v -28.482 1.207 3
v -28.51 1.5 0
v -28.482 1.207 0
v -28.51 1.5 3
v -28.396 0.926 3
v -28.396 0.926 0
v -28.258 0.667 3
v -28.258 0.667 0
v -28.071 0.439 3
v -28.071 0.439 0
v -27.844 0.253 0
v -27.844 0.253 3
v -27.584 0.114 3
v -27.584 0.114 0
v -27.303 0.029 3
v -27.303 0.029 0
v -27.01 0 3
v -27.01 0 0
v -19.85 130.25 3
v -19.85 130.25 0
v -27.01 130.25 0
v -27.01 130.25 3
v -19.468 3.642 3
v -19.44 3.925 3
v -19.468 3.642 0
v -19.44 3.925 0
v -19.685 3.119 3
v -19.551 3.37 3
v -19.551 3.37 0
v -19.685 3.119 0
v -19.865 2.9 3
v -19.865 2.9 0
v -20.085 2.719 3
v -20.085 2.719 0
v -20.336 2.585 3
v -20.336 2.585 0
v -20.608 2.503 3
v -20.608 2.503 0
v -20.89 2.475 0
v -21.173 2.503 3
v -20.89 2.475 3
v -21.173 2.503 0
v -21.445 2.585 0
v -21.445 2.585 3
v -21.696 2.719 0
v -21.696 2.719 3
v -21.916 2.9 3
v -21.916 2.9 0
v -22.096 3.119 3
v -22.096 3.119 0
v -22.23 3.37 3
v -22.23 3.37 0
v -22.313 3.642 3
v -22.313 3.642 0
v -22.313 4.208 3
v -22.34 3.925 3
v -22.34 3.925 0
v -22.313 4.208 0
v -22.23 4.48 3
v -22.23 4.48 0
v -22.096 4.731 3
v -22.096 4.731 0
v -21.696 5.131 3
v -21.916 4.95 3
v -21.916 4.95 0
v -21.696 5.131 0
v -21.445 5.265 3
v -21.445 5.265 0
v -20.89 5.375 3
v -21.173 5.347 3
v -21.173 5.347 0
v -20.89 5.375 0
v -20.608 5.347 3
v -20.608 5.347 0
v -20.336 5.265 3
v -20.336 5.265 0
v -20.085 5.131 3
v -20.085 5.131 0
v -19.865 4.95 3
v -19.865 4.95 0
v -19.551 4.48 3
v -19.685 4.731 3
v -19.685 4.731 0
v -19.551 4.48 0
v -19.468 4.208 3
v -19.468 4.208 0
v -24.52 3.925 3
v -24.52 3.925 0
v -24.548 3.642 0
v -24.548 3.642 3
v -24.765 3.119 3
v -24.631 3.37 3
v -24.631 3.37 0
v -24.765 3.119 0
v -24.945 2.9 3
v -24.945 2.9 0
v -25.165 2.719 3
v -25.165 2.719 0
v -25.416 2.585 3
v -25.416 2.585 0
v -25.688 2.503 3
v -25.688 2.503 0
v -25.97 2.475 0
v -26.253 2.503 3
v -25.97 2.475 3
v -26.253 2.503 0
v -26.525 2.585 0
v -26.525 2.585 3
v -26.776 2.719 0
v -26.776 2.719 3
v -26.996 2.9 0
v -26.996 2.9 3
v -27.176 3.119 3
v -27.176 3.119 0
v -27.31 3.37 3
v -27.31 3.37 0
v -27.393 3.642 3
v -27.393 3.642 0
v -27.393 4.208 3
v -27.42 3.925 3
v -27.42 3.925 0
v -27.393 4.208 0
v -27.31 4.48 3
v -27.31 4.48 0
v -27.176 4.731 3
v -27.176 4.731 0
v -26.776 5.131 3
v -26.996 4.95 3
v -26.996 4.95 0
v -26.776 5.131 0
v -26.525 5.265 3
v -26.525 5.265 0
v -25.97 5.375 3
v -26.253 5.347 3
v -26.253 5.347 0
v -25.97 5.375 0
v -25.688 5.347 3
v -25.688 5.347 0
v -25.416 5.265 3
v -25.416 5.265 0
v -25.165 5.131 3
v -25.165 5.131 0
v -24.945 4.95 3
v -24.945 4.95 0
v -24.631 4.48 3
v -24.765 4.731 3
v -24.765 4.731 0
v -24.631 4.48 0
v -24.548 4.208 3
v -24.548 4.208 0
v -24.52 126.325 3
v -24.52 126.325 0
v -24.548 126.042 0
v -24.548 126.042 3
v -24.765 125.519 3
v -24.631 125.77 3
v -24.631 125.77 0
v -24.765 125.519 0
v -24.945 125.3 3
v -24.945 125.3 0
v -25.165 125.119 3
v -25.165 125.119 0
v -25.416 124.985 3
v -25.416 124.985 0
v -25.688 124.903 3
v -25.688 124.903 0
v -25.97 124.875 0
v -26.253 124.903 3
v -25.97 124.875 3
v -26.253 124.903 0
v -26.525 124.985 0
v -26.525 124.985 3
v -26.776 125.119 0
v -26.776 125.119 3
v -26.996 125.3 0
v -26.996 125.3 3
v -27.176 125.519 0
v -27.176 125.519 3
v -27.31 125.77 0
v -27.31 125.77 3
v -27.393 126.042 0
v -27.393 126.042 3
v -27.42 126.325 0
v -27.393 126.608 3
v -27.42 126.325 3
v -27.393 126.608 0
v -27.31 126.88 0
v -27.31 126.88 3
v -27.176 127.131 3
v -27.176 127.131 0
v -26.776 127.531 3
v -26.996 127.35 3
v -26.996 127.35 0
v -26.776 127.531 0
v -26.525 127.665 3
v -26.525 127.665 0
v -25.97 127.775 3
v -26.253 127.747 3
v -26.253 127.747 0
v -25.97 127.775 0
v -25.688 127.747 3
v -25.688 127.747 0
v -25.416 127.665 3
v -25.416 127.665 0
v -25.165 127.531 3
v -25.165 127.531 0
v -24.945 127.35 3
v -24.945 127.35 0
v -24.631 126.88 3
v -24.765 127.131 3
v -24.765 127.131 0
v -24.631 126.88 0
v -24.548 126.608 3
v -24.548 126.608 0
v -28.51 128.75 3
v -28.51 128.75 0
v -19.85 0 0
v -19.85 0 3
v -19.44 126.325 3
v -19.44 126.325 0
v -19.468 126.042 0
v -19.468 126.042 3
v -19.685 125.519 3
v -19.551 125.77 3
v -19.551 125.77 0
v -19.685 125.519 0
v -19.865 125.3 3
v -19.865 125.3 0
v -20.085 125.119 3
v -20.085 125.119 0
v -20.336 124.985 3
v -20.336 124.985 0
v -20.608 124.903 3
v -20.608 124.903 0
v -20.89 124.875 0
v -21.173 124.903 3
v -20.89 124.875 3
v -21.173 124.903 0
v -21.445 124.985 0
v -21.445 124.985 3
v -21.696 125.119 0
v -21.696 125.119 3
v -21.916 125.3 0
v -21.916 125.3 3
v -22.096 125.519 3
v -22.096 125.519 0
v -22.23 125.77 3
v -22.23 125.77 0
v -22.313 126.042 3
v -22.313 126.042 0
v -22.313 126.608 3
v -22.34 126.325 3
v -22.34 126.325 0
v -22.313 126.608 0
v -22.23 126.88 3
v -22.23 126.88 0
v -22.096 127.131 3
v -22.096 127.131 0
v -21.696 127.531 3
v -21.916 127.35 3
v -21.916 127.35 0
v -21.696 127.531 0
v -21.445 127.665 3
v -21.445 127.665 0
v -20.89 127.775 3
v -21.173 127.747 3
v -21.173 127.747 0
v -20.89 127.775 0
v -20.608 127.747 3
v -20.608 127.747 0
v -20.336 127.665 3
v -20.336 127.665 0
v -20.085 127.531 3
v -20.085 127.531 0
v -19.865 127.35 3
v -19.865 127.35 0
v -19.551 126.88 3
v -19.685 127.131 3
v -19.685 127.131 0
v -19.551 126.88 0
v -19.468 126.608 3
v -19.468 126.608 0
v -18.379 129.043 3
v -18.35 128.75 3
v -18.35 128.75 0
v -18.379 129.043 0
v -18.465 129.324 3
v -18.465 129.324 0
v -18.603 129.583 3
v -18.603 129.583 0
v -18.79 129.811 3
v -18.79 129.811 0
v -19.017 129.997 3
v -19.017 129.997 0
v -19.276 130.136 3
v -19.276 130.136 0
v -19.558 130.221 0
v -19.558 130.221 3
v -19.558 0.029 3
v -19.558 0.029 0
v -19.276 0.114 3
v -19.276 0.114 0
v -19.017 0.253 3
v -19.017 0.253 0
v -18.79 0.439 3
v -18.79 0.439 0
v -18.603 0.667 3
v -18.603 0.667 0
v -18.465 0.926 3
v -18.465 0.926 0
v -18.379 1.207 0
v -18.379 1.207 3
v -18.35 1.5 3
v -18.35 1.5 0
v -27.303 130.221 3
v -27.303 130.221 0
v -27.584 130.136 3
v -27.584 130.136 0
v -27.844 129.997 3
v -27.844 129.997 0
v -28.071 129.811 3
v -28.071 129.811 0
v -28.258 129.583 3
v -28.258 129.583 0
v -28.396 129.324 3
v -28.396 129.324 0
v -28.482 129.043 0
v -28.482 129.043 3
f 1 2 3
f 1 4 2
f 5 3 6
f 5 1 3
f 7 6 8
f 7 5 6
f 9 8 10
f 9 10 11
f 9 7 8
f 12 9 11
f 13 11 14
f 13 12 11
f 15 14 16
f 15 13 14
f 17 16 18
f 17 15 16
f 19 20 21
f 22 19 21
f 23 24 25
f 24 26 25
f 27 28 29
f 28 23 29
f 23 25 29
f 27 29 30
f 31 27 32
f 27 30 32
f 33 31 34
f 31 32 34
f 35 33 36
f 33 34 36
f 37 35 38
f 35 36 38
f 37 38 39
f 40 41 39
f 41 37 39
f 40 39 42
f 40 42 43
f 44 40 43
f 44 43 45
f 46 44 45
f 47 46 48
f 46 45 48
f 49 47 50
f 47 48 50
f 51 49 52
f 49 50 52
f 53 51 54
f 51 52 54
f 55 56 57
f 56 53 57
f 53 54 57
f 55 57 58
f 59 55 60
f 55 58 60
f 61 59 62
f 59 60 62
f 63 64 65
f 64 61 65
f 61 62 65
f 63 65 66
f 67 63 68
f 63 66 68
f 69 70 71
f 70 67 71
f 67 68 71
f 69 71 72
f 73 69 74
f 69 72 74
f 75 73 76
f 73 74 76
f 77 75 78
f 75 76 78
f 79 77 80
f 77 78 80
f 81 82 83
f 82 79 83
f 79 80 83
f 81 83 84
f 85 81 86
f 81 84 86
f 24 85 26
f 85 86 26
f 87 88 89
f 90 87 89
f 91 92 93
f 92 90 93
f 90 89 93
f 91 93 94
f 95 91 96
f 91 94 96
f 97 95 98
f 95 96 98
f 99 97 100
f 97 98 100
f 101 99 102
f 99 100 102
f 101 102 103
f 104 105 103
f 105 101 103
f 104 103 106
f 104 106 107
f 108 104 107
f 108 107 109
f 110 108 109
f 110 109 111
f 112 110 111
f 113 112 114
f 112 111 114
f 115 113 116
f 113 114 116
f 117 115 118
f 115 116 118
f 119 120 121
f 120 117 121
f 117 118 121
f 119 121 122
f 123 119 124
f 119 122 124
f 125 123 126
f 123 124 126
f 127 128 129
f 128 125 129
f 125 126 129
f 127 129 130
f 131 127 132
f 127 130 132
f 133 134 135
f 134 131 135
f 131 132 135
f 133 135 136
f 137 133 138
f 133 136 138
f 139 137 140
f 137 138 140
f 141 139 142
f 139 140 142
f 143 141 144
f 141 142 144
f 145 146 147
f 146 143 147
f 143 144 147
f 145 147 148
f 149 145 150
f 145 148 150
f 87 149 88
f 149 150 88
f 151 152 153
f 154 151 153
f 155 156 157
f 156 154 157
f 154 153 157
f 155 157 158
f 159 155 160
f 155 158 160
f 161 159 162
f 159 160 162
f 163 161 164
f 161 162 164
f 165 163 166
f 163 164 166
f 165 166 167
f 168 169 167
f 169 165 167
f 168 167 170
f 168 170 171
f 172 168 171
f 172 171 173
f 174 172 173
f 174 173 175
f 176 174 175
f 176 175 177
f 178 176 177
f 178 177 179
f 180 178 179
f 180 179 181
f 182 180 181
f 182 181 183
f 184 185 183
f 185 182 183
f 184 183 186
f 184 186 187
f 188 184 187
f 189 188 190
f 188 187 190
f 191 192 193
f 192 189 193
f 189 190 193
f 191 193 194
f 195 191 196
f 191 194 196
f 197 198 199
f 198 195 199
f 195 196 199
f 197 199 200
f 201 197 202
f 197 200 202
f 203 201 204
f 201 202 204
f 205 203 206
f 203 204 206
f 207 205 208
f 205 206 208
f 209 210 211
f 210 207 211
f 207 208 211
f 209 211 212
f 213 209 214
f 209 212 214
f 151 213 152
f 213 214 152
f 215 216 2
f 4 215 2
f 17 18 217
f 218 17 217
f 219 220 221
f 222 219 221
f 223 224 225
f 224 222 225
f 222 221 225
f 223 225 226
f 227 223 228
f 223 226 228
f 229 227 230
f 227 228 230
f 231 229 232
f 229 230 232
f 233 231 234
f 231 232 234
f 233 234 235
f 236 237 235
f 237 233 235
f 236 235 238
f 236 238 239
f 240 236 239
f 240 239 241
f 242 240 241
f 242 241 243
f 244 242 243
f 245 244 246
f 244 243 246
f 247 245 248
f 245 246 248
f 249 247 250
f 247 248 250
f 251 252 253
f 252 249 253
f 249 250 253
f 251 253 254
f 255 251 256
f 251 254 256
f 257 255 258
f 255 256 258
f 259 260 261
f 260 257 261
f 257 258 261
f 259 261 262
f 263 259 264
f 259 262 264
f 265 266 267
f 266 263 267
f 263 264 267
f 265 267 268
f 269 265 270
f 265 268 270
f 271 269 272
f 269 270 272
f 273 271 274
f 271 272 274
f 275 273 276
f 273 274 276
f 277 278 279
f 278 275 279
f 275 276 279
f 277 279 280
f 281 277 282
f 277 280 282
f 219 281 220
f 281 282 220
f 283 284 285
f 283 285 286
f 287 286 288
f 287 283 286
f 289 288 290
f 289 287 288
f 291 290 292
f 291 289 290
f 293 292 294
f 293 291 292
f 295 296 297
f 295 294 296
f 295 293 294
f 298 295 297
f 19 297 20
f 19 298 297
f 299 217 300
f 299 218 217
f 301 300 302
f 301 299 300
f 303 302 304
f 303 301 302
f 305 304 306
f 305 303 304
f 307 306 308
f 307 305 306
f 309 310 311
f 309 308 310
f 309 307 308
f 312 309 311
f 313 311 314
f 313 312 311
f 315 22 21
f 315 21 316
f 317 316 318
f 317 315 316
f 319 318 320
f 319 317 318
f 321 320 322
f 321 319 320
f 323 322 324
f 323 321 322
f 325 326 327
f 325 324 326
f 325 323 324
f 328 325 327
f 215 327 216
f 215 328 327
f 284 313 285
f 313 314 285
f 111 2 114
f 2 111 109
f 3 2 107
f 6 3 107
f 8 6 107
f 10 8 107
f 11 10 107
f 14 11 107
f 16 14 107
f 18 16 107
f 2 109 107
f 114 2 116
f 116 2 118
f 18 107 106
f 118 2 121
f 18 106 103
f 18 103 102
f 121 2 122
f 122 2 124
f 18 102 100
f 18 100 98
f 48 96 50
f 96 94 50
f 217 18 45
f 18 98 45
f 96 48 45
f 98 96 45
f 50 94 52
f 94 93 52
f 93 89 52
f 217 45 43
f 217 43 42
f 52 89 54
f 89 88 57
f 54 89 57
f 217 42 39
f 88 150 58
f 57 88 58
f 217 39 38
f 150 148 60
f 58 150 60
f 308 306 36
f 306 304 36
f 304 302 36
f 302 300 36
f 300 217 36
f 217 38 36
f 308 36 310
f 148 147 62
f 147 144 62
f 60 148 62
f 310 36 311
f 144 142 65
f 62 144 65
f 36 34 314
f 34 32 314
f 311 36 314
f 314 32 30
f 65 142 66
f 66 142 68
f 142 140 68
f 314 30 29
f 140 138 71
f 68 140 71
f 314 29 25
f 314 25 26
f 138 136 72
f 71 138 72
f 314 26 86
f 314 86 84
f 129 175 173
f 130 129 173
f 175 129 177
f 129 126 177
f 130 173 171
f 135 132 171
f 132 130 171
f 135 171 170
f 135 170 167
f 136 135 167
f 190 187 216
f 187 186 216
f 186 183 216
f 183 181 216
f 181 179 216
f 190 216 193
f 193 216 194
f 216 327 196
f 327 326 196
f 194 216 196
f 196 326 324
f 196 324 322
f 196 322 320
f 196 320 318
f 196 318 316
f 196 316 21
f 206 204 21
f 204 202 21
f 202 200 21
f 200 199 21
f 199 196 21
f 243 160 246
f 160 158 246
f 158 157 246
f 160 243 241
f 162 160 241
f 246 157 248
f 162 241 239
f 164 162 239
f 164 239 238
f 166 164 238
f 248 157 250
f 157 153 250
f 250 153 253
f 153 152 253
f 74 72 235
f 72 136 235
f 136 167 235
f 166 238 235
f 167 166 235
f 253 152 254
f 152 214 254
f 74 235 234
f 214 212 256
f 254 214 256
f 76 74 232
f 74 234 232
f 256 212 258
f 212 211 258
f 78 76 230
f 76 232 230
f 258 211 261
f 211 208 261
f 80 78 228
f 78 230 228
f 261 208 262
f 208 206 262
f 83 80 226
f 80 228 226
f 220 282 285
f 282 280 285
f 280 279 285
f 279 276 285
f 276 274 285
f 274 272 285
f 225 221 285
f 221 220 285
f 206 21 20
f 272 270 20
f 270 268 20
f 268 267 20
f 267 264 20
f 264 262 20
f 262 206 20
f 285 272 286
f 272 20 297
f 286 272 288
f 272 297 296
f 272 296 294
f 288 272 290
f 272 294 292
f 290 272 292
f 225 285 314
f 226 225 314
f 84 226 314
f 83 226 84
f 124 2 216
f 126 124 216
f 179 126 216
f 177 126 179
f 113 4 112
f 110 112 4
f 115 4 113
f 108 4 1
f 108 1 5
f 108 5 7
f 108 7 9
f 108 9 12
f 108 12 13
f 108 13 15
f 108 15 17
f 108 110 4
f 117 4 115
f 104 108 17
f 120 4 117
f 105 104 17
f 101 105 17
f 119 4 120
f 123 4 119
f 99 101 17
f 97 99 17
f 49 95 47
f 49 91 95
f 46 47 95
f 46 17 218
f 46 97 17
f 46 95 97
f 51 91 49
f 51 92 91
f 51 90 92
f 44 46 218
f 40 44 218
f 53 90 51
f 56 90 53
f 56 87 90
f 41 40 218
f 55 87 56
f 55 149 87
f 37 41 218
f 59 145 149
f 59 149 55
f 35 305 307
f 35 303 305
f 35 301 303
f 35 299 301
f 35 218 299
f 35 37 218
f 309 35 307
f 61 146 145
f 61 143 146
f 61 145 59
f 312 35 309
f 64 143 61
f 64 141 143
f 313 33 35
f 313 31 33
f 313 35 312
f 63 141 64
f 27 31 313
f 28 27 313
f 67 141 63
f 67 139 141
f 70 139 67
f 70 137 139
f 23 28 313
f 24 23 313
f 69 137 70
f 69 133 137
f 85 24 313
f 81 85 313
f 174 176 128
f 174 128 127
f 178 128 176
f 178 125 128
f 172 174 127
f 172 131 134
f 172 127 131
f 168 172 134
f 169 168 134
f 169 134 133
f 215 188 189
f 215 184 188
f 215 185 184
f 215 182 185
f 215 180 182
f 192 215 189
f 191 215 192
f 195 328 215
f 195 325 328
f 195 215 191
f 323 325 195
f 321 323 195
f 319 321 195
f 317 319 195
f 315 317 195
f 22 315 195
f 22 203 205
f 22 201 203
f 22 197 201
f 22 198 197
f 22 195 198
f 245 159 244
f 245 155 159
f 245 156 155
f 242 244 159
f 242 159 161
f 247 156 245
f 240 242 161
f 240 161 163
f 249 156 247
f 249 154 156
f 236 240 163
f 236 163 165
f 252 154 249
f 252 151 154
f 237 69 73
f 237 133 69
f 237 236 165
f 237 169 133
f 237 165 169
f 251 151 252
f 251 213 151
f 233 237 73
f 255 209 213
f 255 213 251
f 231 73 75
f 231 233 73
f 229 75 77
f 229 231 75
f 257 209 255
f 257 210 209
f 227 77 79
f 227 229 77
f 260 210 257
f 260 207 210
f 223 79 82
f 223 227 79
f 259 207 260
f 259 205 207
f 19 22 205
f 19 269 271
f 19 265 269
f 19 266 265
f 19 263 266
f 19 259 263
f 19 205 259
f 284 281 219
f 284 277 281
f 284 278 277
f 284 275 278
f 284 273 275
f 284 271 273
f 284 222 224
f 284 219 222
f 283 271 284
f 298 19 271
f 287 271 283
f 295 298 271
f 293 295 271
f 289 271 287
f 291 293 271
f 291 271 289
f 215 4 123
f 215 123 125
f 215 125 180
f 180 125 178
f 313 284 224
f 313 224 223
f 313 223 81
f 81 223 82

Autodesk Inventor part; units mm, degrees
ref_plane "YZ Plane" through (0, 0, 0) normal (1, 0, 0) x (0, 1, 0)
ref_plane "XZ Plane" through (0, 0, 0) normal (0, 1, 0) x (-1, 0, 0)
ref_plane "XY Plane" through (0, 0, 0) normal (0, 0, 1) x (1, 0, 0)
ref_plane "Work Plane1" through (0, 0, 0) normal (0, 0, 1) x (1, 0, 0)
sketch "Sketch1" plane through (0, 0, 0) normal (0, 0, 1) x (1, 0, 0)
  line L0 (-31, 2.95) -> (-31, 4.9) projected
  line L1 (-31, 0) -> (-1, 0) projected
  line L2 (-1, 130.25) -> (-31, 130.25) projected
  line L3 (-1, 130.05) -> (-1, 128.3) projected
  line L4 (-1, 0.2) -> (-1, 1.95) projected
  line L5 (-28.5104, 0) -> (-18.3504, 0)
  line L6 (-18.3504, 0) -> (-18.3504, 130.25)
  line L7 (-18.3504, 130.25) -> (-28.5104, 130.25)
  line L8 (-28.5104, 130.25) -> (-28.5104, 0)
  line L9 (-28.5104, 3.925) -> (-18.3504, 3.925) construction
  line L10 (-28.5104, 126.325) -> (-18.3504, 126.325) construction
  circle A0 centre (-25.9704, 3.925) radius 1.45
  circle A1 centre (-20.8904, 3.925) radius 1.45
  line L11 (-23.4304, 3.925) -> (-23.4304, 126.325) construction
  line L12 (-23.4304, 126.325) -> (-23.4304, 248.725) construction
  circle A2 centre (-25.9704, 126.325) radius 1.45
  circle A3 centre (-20.8904, 126.325) radius 1.45
  point P0 (0, 0)
  dimension "d0" = 10.16
  dimension "d1" = 3.925
  dimension "d2" = 3.925
  dimension "d3" = 2.9
  dimension "d4" = 2.9
  dimension "d5" = 2.54
  dimension "d6" = 2.54
  dimension "d9" = 122.4
extrude "Extrusion1" add sketch "Sketch1" along normal blind 3
fillet "Fillet1" radius 1.5 4 edges at (-28.5104, 0, 1.5) (-28.5104, 130.25, 1.5) (-18.3504, 130.25, 1.5) (-18.3504, 0, 1.5)
properties part number "Schroff_Back_Stabilizer"
